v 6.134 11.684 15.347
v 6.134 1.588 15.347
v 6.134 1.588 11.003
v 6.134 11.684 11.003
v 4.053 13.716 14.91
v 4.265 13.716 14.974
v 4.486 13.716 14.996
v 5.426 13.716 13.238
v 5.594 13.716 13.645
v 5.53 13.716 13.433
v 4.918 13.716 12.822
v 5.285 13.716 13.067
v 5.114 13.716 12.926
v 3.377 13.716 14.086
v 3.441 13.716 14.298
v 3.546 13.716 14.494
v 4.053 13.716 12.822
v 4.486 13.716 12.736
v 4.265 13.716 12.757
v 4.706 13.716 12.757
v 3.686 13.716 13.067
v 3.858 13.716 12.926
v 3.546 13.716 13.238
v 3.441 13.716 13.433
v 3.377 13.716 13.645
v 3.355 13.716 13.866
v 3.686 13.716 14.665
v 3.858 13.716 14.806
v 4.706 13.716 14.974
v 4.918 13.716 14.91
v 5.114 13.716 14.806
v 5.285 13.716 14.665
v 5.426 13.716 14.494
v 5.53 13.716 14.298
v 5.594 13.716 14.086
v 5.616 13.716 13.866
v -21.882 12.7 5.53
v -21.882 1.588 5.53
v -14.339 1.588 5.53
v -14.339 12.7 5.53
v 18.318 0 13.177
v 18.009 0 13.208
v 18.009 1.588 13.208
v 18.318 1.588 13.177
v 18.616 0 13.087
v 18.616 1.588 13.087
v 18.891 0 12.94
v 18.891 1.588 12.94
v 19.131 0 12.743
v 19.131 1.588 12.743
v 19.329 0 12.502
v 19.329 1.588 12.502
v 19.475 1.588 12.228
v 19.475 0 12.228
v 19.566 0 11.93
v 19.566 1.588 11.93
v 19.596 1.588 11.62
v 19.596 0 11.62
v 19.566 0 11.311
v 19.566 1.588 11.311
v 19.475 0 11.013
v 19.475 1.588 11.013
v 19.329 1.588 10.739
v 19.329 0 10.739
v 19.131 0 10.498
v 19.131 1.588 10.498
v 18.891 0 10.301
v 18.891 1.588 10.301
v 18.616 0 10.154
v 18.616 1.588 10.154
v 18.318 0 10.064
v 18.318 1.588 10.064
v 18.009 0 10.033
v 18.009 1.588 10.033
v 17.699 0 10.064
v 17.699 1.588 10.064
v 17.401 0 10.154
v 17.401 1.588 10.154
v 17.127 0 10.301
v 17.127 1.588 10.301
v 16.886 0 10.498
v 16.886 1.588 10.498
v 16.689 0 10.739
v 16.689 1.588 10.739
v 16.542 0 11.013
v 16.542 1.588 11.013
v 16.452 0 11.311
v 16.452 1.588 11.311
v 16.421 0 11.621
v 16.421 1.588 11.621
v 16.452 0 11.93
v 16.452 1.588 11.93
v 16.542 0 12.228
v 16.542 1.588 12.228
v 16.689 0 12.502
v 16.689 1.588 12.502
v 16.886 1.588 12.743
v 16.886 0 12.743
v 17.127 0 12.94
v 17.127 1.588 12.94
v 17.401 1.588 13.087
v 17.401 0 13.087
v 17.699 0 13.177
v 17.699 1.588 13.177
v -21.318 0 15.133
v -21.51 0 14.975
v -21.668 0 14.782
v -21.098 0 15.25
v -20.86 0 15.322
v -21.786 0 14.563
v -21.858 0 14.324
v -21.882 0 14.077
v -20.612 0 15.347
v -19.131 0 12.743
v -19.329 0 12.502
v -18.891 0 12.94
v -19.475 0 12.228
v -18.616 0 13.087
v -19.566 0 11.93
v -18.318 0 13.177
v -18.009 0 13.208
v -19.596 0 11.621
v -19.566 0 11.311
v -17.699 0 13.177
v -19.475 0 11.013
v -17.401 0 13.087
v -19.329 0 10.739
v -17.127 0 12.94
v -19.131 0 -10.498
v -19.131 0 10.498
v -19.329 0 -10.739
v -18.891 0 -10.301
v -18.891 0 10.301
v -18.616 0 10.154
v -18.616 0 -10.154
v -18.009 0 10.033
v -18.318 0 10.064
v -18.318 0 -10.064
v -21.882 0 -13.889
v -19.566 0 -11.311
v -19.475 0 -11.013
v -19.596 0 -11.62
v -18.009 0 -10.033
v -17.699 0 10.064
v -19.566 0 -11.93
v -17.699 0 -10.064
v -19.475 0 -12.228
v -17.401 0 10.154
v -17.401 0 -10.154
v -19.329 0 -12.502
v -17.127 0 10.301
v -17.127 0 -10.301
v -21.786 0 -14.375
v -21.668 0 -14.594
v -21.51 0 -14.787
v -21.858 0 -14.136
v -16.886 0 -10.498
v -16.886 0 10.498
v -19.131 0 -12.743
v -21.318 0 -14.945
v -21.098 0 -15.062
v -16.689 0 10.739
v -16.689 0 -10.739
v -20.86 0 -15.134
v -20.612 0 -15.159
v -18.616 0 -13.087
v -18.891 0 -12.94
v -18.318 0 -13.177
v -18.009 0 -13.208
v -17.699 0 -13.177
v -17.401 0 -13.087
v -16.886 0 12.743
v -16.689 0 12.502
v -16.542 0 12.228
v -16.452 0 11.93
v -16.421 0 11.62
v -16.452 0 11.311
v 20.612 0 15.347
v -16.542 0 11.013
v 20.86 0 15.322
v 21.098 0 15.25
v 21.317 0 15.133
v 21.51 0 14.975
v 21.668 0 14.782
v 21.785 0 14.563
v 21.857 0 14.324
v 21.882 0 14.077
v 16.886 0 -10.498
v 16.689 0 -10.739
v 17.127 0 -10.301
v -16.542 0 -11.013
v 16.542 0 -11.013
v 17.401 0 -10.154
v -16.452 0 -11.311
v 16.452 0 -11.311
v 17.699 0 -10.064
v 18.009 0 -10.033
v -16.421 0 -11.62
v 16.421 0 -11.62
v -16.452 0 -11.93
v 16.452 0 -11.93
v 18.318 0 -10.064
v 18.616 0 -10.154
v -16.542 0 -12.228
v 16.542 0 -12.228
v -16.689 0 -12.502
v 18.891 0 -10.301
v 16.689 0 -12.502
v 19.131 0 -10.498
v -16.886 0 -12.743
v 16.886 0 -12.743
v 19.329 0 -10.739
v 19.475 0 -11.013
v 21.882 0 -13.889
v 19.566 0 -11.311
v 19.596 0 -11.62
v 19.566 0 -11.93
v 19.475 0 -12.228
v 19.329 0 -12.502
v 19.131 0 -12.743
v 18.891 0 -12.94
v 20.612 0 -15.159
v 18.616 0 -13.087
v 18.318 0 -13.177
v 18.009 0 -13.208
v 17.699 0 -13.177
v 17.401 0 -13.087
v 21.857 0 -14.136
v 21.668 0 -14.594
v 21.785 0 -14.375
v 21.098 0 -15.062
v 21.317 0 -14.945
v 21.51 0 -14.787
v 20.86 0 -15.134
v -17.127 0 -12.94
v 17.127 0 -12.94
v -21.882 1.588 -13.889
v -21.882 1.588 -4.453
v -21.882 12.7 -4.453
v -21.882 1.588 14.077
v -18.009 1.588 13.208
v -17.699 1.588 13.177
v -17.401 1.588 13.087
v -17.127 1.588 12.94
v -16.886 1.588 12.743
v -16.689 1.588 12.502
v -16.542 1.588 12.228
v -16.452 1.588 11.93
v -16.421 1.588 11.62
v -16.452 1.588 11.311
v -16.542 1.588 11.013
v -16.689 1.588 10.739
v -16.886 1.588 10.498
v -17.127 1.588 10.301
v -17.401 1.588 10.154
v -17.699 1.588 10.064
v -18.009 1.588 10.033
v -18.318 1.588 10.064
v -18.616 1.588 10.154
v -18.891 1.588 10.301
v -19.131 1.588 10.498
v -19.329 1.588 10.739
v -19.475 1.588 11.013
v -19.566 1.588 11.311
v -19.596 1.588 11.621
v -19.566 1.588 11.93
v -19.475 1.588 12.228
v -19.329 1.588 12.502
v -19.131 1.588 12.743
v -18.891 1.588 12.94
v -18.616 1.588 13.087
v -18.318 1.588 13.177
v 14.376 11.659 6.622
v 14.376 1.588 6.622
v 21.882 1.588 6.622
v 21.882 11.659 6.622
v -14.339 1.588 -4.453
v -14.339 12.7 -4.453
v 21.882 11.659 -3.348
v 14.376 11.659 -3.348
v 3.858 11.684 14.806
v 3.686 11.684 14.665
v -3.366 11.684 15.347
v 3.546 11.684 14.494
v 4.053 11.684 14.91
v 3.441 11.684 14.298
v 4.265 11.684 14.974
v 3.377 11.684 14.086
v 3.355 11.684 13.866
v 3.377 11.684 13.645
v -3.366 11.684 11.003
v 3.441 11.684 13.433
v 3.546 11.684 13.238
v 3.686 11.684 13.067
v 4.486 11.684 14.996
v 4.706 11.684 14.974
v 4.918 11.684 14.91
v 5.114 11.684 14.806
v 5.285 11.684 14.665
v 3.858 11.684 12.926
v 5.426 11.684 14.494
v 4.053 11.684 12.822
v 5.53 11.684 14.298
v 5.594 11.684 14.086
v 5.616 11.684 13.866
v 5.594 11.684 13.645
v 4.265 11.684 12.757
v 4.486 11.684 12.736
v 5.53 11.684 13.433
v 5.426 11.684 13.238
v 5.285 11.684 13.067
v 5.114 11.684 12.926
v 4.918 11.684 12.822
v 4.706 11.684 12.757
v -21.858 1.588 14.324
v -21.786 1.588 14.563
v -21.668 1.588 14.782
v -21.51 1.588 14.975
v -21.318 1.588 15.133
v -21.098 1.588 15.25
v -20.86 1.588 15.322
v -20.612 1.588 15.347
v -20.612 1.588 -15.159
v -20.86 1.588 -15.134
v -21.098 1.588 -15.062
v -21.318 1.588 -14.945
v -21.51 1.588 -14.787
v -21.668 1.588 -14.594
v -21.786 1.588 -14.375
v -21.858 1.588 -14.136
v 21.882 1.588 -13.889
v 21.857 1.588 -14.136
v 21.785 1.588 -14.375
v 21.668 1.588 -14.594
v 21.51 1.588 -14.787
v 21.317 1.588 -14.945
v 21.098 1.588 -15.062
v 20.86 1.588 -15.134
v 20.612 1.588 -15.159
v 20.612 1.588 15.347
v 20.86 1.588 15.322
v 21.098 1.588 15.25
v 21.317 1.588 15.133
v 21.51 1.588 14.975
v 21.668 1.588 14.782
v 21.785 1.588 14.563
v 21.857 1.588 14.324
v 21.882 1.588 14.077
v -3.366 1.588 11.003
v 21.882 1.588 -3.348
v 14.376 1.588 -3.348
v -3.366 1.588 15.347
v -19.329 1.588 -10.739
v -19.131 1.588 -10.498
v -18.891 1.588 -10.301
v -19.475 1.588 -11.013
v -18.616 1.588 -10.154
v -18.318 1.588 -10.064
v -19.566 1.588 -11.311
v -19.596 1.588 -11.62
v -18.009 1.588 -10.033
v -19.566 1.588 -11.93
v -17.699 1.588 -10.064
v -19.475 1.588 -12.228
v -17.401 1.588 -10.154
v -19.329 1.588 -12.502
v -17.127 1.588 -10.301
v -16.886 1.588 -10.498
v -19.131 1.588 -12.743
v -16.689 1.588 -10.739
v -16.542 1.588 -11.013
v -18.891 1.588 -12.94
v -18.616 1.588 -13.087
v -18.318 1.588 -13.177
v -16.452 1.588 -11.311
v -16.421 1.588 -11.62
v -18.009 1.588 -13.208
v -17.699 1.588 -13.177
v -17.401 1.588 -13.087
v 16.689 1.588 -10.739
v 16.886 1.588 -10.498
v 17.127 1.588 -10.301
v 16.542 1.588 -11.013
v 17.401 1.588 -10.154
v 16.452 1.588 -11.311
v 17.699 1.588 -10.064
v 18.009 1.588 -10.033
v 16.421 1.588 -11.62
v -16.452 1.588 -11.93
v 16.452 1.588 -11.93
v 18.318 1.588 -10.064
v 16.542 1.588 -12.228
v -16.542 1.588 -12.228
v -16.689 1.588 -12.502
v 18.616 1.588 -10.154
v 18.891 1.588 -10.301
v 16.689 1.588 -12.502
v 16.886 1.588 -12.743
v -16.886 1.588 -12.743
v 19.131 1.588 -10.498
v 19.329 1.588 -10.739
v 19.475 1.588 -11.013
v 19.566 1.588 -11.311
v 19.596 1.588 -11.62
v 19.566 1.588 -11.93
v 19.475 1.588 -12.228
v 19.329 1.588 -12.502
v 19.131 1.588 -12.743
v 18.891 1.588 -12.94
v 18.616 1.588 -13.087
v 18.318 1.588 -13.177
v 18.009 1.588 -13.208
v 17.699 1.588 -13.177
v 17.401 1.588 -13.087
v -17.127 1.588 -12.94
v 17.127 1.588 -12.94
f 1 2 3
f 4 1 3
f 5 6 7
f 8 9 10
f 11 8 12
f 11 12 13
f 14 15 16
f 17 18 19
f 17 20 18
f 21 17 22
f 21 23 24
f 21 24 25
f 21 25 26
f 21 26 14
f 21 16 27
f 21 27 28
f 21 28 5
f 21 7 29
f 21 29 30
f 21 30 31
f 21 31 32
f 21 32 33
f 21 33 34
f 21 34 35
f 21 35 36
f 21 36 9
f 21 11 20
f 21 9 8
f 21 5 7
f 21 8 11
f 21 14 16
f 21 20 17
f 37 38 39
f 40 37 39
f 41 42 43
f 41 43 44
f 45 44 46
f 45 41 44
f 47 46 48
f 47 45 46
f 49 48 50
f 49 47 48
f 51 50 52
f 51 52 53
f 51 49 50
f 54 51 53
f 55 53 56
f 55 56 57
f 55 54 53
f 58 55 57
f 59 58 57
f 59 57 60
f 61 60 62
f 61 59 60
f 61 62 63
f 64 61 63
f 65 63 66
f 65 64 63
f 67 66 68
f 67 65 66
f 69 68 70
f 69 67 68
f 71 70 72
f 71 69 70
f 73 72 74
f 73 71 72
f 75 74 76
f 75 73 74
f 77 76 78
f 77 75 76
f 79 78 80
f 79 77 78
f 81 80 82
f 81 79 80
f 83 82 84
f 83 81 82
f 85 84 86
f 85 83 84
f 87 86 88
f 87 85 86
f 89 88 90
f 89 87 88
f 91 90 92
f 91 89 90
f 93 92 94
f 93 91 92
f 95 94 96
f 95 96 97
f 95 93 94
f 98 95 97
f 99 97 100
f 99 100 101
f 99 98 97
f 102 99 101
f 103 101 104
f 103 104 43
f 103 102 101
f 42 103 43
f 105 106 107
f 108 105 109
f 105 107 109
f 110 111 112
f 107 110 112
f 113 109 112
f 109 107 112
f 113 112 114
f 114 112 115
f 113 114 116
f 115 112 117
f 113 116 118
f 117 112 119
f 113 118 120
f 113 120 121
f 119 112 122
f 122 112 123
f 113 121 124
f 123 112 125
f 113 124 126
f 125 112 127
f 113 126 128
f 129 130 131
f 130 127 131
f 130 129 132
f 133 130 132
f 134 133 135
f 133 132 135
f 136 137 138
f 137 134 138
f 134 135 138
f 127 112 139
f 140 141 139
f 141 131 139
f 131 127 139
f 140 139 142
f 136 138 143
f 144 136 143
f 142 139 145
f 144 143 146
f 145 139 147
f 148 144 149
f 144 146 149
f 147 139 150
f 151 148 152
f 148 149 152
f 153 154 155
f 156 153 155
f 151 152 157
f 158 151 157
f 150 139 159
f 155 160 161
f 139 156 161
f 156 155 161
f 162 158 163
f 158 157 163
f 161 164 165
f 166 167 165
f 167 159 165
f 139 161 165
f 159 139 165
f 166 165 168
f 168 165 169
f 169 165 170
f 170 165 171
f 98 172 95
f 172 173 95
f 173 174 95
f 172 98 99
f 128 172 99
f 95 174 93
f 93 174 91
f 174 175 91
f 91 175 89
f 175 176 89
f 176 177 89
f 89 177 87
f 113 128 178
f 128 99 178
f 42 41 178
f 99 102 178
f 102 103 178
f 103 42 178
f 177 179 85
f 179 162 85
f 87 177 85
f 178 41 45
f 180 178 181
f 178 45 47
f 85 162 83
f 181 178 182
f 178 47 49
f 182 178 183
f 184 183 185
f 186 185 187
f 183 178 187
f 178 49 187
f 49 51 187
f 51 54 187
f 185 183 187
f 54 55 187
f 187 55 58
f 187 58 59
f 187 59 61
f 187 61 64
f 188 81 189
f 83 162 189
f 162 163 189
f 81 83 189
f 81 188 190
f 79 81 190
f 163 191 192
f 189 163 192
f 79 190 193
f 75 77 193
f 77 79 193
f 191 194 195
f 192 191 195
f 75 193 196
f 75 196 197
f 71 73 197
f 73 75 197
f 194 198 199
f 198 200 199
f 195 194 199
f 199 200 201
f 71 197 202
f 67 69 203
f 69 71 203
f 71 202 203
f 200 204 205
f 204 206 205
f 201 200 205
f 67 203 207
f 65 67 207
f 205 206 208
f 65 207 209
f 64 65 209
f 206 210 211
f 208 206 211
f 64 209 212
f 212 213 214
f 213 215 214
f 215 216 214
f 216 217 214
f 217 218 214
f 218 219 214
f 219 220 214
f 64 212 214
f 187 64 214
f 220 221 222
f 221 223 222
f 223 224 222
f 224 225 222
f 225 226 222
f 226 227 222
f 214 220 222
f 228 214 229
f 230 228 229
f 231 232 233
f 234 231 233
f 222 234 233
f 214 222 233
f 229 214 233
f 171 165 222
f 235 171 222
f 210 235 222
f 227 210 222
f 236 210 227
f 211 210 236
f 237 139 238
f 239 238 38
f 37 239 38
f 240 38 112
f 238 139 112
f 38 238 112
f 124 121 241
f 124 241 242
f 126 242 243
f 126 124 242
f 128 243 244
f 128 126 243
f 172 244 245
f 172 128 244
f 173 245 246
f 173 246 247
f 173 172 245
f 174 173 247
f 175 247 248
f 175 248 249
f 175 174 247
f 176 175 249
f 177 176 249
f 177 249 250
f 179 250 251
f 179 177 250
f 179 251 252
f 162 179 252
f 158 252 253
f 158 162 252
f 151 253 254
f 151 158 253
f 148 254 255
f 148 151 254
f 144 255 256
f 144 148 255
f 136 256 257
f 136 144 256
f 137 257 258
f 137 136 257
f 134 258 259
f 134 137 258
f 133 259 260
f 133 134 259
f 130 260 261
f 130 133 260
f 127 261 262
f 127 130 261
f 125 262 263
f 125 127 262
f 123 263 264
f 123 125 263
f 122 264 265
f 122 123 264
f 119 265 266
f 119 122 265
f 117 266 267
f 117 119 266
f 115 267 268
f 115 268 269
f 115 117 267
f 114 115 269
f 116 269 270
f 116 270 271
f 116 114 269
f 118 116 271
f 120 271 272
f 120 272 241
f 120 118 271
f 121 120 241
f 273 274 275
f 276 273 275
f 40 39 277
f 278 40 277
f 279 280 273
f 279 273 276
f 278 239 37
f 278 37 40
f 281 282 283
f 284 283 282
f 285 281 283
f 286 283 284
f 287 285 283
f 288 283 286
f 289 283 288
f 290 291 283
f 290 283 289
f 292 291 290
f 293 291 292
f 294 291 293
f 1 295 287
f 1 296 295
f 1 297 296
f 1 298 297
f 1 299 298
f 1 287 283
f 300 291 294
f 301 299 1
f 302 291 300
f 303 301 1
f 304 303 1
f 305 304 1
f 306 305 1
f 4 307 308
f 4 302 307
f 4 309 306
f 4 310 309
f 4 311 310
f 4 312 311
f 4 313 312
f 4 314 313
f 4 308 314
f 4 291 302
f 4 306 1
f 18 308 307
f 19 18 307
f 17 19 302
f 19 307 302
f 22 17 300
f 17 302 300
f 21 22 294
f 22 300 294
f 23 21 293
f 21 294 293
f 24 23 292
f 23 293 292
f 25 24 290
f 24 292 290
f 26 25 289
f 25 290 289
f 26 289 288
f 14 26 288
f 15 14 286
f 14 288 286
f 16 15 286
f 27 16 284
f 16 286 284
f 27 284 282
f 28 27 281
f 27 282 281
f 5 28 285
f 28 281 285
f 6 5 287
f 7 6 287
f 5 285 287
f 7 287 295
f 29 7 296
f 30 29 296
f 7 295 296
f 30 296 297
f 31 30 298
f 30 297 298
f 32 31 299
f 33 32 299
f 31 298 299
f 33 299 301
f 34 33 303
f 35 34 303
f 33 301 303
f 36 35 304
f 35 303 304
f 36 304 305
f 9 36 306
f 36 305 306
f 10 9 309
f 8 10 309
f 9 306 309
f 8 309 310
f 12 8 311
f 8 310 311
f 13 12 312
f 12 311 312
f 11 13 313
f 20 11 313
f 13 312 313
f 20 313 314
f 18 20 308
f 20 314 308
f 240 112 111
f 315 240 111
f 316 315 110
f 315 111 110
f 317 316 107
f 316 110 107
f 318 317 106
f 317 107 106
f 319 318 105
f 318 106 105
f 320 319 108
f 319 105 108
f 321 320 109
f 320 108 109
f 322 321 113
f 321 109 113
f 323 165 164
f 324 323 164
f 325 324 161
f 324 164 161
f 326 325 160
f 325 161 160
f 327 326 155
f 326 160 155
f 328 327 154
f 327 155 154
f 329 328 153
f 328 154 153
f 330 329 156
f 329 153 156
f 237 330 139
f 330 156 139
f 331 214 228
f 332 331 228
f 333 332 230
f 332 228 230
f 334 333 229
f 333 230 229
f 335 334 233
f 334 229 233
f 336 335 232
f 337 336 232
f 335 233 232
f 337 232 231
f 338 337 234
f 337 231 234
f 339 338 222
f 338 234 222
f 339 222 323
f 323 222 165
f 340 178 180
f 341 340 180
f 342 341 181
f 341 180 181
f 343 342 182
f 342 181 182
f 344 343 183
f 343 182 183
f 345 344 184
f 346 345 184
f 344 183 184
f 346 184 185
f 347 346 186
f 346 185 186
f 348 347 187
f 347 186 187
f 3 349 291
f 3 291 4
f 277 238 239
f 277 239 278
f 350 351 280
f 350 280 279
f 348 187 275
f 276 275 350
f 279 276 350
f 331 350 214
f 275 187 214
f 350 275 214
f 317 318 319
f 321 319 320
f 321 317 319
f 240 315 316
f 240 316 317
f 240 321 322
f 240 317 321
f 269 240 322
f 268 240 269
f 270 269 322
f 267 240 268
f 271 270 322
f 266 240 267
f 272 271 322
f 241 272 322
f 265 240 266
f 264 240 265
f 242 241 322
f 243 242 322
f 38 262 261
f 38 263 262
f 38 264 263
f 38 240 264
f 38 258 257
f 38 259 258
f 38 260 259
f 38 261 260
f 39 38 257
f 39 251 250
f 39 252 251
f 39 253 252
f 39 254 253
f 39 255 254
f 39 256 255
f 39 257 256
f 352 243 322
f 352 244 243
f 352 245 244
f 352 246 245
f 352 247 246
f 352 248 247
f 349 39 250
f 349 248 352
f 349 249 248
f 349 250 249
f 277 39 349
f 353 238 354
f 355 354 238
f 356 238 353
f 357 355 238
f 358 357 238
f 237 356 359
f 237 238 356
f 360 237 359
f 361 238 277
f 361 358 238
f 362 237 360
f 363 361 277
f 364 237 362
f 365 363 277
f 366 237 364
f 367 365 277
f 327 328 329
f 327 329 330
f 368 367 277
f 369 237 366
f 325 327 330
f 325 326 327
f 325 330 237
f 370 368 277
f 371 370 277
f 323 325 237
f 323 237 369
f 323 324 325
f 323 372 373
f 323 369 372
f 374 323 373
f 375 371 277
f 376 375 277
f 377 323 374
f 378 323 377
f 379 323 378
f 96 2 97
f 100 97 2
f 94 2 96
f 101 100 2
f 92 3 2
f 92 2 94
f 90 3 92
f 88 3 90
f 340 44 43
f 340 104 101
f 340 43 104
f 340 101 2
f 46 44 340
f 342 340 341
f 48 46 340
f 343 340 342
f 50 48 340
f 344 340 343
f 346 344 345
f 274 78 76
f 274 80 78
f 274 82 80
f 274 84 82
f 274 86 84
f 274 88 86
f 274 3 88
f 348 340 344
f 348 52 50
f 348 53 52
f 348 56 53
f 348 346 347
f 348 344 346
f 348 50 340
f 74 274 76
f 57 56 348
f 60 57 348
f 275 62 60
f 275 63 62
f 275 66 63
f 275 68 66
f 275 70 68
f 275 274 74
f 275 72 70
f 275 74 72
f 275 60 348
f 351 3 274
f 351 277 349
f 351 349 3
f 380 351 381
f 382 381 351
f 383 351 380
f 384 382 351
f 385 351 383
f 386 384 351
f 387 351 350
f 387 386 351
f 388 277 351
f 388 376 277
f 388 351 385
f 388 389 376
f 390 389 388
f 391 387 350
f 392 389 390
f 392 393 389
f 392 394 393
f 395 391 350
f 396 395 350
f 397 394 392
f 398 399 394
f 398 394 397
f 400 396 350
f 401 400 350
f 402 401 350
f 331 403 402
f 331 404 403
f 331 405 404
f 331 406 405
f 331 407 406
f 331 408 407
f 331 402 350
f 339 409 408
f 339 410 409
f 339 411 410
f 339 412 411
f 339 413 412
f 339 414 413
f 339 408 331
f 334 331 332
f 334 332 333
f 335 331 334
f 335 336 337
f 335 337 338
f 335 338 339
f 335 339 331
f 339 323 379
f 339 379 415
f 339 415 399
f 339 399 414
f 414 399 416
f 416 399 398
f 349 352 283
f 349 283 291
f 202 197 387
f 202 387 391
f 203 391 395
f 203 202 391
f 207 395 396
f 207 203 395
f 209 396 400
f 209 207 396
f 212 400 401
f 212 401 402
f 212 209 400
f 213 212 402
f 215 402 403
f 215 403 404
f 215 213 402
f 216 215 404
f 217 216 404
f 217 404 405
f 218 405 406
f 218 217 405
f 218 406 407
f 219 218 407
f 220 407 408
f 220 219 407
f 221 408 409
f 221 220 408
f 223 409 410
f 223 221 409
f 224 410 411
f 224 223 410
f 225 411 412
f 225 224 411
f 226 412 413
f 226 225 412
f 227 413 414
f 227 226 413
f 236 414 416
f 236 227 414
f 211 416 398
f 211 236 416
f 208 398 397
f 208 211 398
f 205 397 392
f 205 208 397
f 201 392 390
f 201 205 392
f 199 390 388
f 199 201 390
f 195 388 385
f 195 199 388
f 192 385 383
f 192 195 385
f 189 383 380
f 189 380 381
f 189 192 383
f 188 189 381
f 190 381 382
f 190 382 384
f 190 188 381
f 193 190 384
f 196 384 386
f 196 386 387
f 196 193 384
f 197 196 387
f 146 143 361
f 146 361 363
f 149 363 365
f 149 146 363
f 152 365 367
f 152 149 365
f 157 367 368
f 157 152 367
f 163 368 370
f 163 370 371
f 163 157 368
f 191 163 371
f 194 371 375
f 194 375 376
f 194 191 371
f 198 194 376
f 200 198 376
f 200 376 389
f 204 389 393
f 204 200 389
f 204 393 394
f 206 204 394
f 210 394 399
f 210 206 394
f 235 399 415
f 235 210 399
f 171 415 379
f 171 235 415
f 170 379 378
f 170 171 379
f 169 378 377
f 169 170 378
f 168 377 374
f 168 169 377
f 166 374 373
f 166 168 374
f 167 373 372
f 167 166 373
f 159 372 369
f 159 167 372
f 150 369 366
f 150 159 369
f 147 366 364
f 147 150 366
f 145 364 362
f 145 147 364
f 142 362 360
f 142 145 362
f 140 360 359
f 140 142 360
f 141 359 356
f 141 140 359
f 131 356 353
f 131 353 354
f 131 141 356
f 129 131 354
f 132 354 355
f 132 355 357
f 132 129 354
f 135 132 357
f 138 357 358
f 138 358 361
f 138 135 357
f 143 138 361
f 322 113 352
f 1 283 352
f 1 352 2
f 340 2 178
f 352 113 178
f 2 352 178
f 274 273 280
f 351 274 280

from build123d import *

# Parameters (mm, degrees)
SKETCH1_R           = 1.5875
BOSS_EXTRUDE4_DEPTH = 1.5875
SKETCH2_W           = 7.5057
SKETCH2_H           = 9.9695
BOSS_EXTRUDE5_DEPTH = 10.0711
SKETCH3_W           = 9.4996
SKETCH3_H           = 4.3434
BOSS_EXTRUDE6_DEPTH = 10.0965
SKETCH5_R           = 1.1303
BOSS_EXTRUDE7_DEPTH = 2.032
SKETCH6_W           = 7.5438
SKETCH6_H           = 9.9822
BOSS_EXTRUDE8_DEPTH = 11.1125


with BuildPart() as part:
    # Sketch1 → Boss-Extrude4 (new body)
    with BuildSketch(Plane(origin=(0, 0, 0), x_dir=(1, 0, 0), z_dir=(0, 1, 0))):
        with BuildLine():
            Line((21.881838929, -14.076705181), (21.881838929, 13.888694819))
            ThreePointArc((21.881838929, 13.888694819), (21.509864541, 14.786720431), (20.611838929, 15.158694819))
            Line((20.611838929, 15.158694819), (-20.612361071, 15.158694819))
            ThreePointArc((-20.612361071, 15.158694819), (-21.510386683, 14.786720431), (-21.882361071, 13.888694819))
            Line((-21.882361071, 13.888694819), (-21.882361071, -14.076705181))
            ThreePointArc((-21.882361071, -14.076705181), (-21.510386683, -14.974730793), (-20.612361071, -15.346705181))
            Line((-20.612361071, -15.346705181), (20.611838929, -15.346705181))
            ThreePointArc((20.611838929, -15.346705181), (21.509864541, -14.974730793), (21.881838929, -14.076705181))
        make_face()
        with Locations(Location((18.0086, 11.6205, 0), (0, 0, 270))):
            Circle(SKETCH1_R, mode=Mode.SUBTRACT)
        with Locations(Location((-18.0086, 11.6205, 0), (0, 0, 270))):
            Circle(SKETCH1_R, mode=Mode.SUBTRACT)
        with Locations(Location((-18.0086, -11.6205, 0), (0, 0, 270))):
            Circle(SKETCH1_R, mode=Mode.SUBTRACT)
        with Locations(Location((18.0086, -11.6205, 0), (0, 0, 270))):
            Circle(SKETCH1_R, mode=Mode.SUBTRACT)
    extrude(amount=BOSS_EXTRUDE4_DEPTH)

    # Sketch2 → Boss-Extrude5 (add)
    with BuildSketch(Plane(origin=(0, 1.5875, 0), x_dir=(1, 0, 0), z_dir=(0, 1, 0))):
        with Locations((18.128988929, -1.637055181)):
            Rectangle(SKETCH2_W, SKETCH2_H)
    extrude(amount=BOSS_EXTRUDE5_DEPTH)

    # Sketch3 → Boss-Extrude6 (add)
    with BuildSketch(Plane(origin=(0, 1.5875, 0), x_dir=(1, 0, 0), z_dir=(0, 1, 0))):
        with Locations((1.384038929, -13.175005181)):
            Rectangle(SKETCH3_W, SKETCH3_H)
    extrude(amount=BOSS_EXTRUDE6_DEPTH)

    # Sketch5 → Boss-Extrude7 (add)
    with BuildSketch(Plane(origin=(0, 11.684, 0), x_dir=(1, 0, 0), z_dir=(0, 1, 0))):
        with Locations(Location((4.485703039, -13.865914998, 0), (0, 0, 90))):
            Circle(SKETCH5_R)
    extrude(amount=BOSS_EXTRUDE7_DEPTH)

    # Sketch6 → Boss-Extrude8 (add)
    with BuildSketch(Plane(origin=(0, 1.5875, 0), x_dir=(1, 0, 0), z_dir=(0, 1, 0))):
        with Locations((-18.110461071, -0.538505181)):
            Rectangle(SKETCH6_W, SKETCH6_H)
    extrude(amount=BOSS_EXTRUDE8_DEPTH)


solid = part.part
